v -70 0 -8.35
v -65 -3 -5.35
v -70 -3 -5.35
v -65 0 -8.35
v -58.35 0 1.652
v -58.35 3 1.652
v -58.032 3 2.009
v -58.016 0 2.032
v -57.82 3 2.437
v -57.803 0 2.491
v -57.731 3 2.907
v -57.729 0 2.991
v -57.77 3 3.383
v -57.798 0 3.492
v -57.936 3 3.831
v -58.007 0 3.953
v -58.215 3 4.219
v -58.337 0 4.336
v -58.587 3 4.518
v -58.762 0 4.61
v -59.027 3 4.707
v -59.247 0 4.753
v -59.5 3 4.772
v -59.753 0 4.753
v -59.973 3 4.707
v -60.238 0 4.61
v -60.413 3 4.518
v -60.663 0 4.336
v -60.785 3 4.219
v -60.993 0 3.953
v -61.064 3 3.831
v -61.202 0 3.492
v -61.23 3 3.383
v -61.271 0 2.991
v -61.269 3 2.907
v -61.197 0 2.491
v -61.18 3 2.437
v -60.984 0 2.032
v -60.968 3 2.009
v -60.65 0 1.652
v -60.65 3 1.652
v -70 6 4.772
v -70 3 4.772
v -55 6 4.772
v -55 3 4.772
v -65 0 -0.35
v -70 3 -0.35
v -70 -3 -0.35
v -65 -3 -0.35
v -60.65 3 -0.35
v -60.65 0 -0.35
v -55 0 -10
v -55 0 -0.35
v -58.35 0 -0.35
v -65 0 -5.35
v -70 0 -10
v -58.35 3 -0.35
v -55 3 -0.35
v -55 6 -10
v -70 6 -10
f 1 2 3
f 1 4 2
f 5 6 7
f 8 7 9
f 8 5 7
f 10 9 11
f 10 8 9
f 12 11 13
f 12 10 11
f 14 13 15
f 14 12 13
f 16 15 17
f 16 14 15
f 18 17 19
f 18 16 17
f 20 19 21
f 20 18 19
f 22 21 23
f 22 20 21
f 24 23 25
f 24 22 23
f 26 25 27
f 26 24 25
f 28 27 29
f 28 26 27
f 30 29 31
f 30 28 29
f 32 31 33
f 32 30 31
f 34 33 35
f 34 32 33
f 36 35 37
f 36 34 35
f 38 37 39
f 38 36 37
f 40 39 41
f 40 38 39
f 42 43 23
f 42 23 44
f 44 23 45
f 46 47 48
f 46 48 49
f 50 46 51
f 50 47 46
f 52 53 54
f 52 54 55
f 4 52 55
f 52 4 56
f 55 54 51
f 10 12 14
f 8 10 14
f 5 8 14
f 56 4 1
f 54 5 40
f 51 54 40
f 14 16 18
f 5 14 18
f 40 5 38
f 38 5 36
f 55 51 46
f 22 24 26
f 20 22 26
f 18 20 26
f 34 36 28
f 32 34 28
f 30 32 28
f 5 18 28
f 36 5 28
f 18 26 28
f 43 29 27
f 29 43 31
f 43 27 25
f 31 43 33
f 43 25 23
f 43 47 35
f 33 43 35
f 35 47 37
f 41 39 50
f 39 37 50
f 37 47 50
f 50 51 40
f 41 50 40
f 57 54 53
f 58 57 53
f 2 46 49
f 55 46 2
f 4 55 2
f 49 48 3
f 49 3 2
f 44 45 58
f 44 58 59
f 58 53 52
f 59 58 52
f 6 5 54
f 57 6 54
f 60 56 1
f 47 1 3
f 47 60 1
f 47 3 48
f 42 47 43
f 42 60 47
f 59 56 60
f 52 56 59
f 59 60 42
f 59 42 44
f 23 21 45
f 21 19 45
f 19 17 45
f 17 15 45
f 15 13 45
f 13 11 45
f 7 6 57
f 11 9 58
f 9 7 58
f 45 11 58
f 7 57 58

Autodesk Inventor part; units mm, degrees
ref_plane "YZ Plane" through (0, 0, 0) normal (1, 0, 0) x (0, 1, 0)
ref_plane "XZ Plane" through (0, 0, 0) normal (0, 1, 0) x (-1, 0, 0)
ref_plane "XY Plane" through (0, 0, 0) normal (0, 0, 1) x (1, 0, 0)
sketch "Esboço1" plane through (0, 0, 0) normal (0, 1, 0) x (-1, 0, 0)
  line L0 (55, -0.35) -> (55, -10)
  line L1 (67, -0.35) -> (67, -10)
  line L2 (67, -10) -> (55, -10)
  arc A0 (60.65, 1.6525) -> (58.35, 1.6525) centre (59.5, 3) ccw
  line L3 (58.35, 0) -> (58.35, 1.6525)
  line L4 (60.65, 0) -> (60.65, 1.6525)
  line L5 (60.65, 0) -> (60.65, -0.35)
  line L6 (60.65, -0.35) -> (67, -0.35)
  line L7 (58.35, 0) -> (58.35, -0.35)
  line L8 (58.35, -0.35) -> (55, -0.35)
  point P0 (0, 0)
  point P1 (-4, 56.431)
  dimension "d5" = 3.543
  dimension "d8" = 0.35
extrude "Extrusão1" add sketch "Esboço1" along normal blind 3
sketch "Esboço2" plane through (0, 3, 0) normal (0, 1, 0) x (1, 0, 0)
  point P0 (0, 0)
sketch "Esboço3" plane through (-67, 0, -10) normal (-1, 0, 0) x (0, 0, 1)
  line L0 (9.65, 0) -> (9.65, 3) projected
  line L1 (9.65, 0) -> (9.65, 3)
  line L2 (9.65, 3) -> (0, 3) projected
  line L3 (9.65, 3) -> (0, 3)
  line L4 (0, 0) -> (0, 3) projected
  line L5 (0, 3) -> (0, 0)
  line L6 (0, 0) -> (9.65, 0)
  point P0 (10, 0)
extrude "Extrusão2" add sketch "Esboço3" along normal blind 3
sketch "Esboço4" plane through (0, 3, 0) normal (0, 1, 0) x (1, 0, 0)
  arc A0 (-60.65, -1.6525) -> (-58.35, -1.6525) centre (-59.5, -3) ccw projected
  line L0 (-58.35, 0.35) -> (-55, 0.35) projected
  line L1 (-55, 0.35) -> (-55, -4.7715)
  line L2 (-60.65, 0.35) -> (-70, 0.35) projected
  line L3 (-70, 0.35) -> (-70, -4.7715)
  line L4 (-70, -4.7715) -> (-55, -4.7715)
  line L5 (-70, 0.35) -> (-70, 3.35)
  line L6 (-70, 10) -> (-70, 0.35) projected
  line L7 (-70, 3.35) -> (-55, 3.35)
  line L8 (-55, 3.35) -> (-55, 0.35)
  point P0 (0, 0)
  dimension "d14" = 3
extrude "Extrusão3" add sketch "Esboço4" along normal blind 3
sketch "Esboço5" plane through (0, 3, 0) normal (0, 1, 0) x (1, 0, 0)
  line L0 (-70, 10) -> (-55, 10) projected
  line L1 (-70, 3.35) -> (-55, 3.35) projected
  line L2 (-55, 10) -> (-70, 10)
  line L3 (-70, 10) -> (-70, 3.35)
  line L4 (-70, 3.35) -> (-55, 3.35)
  line L5 (-55, 3.35) -> (-55, 10)
  point P0 (0, 0)
extrude "Extrusão4" add sketch "Esboço5" along normal blind 3
sketch "Esboço6" plane through (0, 0, 0) normal (0, -1, 0) x (1, 0, 0)
  line L0 (-70, -0.35) -> (-70, 4.7715) projected
  line L1 (-70, -0.35) -> (-65, -0.35)
  line L2 (-60.65, -0.35) -> (-70, -0.35) projected
  line L3 (-65, -0.35) -> (-65, -5.35)
  line L4 (-65, -5.35) -> (-70, -5.35)
  line L5 (-70, -10) -> (-70, -0.35) projected
  line L6 (-70, -0.35) -> (-70, -5.35)
  point P0 (0, 0)
  dimension "d19" = 5
  dimension "d20" = 5
extrude "Extrusão5" add sketch "Esboço6" along normal blind 3
chamfer "Chanfro1" distance 3 angle 45 1 edges at (-67.5, 0, -5.35)
properties part number "encaixe suporte controlador L"
